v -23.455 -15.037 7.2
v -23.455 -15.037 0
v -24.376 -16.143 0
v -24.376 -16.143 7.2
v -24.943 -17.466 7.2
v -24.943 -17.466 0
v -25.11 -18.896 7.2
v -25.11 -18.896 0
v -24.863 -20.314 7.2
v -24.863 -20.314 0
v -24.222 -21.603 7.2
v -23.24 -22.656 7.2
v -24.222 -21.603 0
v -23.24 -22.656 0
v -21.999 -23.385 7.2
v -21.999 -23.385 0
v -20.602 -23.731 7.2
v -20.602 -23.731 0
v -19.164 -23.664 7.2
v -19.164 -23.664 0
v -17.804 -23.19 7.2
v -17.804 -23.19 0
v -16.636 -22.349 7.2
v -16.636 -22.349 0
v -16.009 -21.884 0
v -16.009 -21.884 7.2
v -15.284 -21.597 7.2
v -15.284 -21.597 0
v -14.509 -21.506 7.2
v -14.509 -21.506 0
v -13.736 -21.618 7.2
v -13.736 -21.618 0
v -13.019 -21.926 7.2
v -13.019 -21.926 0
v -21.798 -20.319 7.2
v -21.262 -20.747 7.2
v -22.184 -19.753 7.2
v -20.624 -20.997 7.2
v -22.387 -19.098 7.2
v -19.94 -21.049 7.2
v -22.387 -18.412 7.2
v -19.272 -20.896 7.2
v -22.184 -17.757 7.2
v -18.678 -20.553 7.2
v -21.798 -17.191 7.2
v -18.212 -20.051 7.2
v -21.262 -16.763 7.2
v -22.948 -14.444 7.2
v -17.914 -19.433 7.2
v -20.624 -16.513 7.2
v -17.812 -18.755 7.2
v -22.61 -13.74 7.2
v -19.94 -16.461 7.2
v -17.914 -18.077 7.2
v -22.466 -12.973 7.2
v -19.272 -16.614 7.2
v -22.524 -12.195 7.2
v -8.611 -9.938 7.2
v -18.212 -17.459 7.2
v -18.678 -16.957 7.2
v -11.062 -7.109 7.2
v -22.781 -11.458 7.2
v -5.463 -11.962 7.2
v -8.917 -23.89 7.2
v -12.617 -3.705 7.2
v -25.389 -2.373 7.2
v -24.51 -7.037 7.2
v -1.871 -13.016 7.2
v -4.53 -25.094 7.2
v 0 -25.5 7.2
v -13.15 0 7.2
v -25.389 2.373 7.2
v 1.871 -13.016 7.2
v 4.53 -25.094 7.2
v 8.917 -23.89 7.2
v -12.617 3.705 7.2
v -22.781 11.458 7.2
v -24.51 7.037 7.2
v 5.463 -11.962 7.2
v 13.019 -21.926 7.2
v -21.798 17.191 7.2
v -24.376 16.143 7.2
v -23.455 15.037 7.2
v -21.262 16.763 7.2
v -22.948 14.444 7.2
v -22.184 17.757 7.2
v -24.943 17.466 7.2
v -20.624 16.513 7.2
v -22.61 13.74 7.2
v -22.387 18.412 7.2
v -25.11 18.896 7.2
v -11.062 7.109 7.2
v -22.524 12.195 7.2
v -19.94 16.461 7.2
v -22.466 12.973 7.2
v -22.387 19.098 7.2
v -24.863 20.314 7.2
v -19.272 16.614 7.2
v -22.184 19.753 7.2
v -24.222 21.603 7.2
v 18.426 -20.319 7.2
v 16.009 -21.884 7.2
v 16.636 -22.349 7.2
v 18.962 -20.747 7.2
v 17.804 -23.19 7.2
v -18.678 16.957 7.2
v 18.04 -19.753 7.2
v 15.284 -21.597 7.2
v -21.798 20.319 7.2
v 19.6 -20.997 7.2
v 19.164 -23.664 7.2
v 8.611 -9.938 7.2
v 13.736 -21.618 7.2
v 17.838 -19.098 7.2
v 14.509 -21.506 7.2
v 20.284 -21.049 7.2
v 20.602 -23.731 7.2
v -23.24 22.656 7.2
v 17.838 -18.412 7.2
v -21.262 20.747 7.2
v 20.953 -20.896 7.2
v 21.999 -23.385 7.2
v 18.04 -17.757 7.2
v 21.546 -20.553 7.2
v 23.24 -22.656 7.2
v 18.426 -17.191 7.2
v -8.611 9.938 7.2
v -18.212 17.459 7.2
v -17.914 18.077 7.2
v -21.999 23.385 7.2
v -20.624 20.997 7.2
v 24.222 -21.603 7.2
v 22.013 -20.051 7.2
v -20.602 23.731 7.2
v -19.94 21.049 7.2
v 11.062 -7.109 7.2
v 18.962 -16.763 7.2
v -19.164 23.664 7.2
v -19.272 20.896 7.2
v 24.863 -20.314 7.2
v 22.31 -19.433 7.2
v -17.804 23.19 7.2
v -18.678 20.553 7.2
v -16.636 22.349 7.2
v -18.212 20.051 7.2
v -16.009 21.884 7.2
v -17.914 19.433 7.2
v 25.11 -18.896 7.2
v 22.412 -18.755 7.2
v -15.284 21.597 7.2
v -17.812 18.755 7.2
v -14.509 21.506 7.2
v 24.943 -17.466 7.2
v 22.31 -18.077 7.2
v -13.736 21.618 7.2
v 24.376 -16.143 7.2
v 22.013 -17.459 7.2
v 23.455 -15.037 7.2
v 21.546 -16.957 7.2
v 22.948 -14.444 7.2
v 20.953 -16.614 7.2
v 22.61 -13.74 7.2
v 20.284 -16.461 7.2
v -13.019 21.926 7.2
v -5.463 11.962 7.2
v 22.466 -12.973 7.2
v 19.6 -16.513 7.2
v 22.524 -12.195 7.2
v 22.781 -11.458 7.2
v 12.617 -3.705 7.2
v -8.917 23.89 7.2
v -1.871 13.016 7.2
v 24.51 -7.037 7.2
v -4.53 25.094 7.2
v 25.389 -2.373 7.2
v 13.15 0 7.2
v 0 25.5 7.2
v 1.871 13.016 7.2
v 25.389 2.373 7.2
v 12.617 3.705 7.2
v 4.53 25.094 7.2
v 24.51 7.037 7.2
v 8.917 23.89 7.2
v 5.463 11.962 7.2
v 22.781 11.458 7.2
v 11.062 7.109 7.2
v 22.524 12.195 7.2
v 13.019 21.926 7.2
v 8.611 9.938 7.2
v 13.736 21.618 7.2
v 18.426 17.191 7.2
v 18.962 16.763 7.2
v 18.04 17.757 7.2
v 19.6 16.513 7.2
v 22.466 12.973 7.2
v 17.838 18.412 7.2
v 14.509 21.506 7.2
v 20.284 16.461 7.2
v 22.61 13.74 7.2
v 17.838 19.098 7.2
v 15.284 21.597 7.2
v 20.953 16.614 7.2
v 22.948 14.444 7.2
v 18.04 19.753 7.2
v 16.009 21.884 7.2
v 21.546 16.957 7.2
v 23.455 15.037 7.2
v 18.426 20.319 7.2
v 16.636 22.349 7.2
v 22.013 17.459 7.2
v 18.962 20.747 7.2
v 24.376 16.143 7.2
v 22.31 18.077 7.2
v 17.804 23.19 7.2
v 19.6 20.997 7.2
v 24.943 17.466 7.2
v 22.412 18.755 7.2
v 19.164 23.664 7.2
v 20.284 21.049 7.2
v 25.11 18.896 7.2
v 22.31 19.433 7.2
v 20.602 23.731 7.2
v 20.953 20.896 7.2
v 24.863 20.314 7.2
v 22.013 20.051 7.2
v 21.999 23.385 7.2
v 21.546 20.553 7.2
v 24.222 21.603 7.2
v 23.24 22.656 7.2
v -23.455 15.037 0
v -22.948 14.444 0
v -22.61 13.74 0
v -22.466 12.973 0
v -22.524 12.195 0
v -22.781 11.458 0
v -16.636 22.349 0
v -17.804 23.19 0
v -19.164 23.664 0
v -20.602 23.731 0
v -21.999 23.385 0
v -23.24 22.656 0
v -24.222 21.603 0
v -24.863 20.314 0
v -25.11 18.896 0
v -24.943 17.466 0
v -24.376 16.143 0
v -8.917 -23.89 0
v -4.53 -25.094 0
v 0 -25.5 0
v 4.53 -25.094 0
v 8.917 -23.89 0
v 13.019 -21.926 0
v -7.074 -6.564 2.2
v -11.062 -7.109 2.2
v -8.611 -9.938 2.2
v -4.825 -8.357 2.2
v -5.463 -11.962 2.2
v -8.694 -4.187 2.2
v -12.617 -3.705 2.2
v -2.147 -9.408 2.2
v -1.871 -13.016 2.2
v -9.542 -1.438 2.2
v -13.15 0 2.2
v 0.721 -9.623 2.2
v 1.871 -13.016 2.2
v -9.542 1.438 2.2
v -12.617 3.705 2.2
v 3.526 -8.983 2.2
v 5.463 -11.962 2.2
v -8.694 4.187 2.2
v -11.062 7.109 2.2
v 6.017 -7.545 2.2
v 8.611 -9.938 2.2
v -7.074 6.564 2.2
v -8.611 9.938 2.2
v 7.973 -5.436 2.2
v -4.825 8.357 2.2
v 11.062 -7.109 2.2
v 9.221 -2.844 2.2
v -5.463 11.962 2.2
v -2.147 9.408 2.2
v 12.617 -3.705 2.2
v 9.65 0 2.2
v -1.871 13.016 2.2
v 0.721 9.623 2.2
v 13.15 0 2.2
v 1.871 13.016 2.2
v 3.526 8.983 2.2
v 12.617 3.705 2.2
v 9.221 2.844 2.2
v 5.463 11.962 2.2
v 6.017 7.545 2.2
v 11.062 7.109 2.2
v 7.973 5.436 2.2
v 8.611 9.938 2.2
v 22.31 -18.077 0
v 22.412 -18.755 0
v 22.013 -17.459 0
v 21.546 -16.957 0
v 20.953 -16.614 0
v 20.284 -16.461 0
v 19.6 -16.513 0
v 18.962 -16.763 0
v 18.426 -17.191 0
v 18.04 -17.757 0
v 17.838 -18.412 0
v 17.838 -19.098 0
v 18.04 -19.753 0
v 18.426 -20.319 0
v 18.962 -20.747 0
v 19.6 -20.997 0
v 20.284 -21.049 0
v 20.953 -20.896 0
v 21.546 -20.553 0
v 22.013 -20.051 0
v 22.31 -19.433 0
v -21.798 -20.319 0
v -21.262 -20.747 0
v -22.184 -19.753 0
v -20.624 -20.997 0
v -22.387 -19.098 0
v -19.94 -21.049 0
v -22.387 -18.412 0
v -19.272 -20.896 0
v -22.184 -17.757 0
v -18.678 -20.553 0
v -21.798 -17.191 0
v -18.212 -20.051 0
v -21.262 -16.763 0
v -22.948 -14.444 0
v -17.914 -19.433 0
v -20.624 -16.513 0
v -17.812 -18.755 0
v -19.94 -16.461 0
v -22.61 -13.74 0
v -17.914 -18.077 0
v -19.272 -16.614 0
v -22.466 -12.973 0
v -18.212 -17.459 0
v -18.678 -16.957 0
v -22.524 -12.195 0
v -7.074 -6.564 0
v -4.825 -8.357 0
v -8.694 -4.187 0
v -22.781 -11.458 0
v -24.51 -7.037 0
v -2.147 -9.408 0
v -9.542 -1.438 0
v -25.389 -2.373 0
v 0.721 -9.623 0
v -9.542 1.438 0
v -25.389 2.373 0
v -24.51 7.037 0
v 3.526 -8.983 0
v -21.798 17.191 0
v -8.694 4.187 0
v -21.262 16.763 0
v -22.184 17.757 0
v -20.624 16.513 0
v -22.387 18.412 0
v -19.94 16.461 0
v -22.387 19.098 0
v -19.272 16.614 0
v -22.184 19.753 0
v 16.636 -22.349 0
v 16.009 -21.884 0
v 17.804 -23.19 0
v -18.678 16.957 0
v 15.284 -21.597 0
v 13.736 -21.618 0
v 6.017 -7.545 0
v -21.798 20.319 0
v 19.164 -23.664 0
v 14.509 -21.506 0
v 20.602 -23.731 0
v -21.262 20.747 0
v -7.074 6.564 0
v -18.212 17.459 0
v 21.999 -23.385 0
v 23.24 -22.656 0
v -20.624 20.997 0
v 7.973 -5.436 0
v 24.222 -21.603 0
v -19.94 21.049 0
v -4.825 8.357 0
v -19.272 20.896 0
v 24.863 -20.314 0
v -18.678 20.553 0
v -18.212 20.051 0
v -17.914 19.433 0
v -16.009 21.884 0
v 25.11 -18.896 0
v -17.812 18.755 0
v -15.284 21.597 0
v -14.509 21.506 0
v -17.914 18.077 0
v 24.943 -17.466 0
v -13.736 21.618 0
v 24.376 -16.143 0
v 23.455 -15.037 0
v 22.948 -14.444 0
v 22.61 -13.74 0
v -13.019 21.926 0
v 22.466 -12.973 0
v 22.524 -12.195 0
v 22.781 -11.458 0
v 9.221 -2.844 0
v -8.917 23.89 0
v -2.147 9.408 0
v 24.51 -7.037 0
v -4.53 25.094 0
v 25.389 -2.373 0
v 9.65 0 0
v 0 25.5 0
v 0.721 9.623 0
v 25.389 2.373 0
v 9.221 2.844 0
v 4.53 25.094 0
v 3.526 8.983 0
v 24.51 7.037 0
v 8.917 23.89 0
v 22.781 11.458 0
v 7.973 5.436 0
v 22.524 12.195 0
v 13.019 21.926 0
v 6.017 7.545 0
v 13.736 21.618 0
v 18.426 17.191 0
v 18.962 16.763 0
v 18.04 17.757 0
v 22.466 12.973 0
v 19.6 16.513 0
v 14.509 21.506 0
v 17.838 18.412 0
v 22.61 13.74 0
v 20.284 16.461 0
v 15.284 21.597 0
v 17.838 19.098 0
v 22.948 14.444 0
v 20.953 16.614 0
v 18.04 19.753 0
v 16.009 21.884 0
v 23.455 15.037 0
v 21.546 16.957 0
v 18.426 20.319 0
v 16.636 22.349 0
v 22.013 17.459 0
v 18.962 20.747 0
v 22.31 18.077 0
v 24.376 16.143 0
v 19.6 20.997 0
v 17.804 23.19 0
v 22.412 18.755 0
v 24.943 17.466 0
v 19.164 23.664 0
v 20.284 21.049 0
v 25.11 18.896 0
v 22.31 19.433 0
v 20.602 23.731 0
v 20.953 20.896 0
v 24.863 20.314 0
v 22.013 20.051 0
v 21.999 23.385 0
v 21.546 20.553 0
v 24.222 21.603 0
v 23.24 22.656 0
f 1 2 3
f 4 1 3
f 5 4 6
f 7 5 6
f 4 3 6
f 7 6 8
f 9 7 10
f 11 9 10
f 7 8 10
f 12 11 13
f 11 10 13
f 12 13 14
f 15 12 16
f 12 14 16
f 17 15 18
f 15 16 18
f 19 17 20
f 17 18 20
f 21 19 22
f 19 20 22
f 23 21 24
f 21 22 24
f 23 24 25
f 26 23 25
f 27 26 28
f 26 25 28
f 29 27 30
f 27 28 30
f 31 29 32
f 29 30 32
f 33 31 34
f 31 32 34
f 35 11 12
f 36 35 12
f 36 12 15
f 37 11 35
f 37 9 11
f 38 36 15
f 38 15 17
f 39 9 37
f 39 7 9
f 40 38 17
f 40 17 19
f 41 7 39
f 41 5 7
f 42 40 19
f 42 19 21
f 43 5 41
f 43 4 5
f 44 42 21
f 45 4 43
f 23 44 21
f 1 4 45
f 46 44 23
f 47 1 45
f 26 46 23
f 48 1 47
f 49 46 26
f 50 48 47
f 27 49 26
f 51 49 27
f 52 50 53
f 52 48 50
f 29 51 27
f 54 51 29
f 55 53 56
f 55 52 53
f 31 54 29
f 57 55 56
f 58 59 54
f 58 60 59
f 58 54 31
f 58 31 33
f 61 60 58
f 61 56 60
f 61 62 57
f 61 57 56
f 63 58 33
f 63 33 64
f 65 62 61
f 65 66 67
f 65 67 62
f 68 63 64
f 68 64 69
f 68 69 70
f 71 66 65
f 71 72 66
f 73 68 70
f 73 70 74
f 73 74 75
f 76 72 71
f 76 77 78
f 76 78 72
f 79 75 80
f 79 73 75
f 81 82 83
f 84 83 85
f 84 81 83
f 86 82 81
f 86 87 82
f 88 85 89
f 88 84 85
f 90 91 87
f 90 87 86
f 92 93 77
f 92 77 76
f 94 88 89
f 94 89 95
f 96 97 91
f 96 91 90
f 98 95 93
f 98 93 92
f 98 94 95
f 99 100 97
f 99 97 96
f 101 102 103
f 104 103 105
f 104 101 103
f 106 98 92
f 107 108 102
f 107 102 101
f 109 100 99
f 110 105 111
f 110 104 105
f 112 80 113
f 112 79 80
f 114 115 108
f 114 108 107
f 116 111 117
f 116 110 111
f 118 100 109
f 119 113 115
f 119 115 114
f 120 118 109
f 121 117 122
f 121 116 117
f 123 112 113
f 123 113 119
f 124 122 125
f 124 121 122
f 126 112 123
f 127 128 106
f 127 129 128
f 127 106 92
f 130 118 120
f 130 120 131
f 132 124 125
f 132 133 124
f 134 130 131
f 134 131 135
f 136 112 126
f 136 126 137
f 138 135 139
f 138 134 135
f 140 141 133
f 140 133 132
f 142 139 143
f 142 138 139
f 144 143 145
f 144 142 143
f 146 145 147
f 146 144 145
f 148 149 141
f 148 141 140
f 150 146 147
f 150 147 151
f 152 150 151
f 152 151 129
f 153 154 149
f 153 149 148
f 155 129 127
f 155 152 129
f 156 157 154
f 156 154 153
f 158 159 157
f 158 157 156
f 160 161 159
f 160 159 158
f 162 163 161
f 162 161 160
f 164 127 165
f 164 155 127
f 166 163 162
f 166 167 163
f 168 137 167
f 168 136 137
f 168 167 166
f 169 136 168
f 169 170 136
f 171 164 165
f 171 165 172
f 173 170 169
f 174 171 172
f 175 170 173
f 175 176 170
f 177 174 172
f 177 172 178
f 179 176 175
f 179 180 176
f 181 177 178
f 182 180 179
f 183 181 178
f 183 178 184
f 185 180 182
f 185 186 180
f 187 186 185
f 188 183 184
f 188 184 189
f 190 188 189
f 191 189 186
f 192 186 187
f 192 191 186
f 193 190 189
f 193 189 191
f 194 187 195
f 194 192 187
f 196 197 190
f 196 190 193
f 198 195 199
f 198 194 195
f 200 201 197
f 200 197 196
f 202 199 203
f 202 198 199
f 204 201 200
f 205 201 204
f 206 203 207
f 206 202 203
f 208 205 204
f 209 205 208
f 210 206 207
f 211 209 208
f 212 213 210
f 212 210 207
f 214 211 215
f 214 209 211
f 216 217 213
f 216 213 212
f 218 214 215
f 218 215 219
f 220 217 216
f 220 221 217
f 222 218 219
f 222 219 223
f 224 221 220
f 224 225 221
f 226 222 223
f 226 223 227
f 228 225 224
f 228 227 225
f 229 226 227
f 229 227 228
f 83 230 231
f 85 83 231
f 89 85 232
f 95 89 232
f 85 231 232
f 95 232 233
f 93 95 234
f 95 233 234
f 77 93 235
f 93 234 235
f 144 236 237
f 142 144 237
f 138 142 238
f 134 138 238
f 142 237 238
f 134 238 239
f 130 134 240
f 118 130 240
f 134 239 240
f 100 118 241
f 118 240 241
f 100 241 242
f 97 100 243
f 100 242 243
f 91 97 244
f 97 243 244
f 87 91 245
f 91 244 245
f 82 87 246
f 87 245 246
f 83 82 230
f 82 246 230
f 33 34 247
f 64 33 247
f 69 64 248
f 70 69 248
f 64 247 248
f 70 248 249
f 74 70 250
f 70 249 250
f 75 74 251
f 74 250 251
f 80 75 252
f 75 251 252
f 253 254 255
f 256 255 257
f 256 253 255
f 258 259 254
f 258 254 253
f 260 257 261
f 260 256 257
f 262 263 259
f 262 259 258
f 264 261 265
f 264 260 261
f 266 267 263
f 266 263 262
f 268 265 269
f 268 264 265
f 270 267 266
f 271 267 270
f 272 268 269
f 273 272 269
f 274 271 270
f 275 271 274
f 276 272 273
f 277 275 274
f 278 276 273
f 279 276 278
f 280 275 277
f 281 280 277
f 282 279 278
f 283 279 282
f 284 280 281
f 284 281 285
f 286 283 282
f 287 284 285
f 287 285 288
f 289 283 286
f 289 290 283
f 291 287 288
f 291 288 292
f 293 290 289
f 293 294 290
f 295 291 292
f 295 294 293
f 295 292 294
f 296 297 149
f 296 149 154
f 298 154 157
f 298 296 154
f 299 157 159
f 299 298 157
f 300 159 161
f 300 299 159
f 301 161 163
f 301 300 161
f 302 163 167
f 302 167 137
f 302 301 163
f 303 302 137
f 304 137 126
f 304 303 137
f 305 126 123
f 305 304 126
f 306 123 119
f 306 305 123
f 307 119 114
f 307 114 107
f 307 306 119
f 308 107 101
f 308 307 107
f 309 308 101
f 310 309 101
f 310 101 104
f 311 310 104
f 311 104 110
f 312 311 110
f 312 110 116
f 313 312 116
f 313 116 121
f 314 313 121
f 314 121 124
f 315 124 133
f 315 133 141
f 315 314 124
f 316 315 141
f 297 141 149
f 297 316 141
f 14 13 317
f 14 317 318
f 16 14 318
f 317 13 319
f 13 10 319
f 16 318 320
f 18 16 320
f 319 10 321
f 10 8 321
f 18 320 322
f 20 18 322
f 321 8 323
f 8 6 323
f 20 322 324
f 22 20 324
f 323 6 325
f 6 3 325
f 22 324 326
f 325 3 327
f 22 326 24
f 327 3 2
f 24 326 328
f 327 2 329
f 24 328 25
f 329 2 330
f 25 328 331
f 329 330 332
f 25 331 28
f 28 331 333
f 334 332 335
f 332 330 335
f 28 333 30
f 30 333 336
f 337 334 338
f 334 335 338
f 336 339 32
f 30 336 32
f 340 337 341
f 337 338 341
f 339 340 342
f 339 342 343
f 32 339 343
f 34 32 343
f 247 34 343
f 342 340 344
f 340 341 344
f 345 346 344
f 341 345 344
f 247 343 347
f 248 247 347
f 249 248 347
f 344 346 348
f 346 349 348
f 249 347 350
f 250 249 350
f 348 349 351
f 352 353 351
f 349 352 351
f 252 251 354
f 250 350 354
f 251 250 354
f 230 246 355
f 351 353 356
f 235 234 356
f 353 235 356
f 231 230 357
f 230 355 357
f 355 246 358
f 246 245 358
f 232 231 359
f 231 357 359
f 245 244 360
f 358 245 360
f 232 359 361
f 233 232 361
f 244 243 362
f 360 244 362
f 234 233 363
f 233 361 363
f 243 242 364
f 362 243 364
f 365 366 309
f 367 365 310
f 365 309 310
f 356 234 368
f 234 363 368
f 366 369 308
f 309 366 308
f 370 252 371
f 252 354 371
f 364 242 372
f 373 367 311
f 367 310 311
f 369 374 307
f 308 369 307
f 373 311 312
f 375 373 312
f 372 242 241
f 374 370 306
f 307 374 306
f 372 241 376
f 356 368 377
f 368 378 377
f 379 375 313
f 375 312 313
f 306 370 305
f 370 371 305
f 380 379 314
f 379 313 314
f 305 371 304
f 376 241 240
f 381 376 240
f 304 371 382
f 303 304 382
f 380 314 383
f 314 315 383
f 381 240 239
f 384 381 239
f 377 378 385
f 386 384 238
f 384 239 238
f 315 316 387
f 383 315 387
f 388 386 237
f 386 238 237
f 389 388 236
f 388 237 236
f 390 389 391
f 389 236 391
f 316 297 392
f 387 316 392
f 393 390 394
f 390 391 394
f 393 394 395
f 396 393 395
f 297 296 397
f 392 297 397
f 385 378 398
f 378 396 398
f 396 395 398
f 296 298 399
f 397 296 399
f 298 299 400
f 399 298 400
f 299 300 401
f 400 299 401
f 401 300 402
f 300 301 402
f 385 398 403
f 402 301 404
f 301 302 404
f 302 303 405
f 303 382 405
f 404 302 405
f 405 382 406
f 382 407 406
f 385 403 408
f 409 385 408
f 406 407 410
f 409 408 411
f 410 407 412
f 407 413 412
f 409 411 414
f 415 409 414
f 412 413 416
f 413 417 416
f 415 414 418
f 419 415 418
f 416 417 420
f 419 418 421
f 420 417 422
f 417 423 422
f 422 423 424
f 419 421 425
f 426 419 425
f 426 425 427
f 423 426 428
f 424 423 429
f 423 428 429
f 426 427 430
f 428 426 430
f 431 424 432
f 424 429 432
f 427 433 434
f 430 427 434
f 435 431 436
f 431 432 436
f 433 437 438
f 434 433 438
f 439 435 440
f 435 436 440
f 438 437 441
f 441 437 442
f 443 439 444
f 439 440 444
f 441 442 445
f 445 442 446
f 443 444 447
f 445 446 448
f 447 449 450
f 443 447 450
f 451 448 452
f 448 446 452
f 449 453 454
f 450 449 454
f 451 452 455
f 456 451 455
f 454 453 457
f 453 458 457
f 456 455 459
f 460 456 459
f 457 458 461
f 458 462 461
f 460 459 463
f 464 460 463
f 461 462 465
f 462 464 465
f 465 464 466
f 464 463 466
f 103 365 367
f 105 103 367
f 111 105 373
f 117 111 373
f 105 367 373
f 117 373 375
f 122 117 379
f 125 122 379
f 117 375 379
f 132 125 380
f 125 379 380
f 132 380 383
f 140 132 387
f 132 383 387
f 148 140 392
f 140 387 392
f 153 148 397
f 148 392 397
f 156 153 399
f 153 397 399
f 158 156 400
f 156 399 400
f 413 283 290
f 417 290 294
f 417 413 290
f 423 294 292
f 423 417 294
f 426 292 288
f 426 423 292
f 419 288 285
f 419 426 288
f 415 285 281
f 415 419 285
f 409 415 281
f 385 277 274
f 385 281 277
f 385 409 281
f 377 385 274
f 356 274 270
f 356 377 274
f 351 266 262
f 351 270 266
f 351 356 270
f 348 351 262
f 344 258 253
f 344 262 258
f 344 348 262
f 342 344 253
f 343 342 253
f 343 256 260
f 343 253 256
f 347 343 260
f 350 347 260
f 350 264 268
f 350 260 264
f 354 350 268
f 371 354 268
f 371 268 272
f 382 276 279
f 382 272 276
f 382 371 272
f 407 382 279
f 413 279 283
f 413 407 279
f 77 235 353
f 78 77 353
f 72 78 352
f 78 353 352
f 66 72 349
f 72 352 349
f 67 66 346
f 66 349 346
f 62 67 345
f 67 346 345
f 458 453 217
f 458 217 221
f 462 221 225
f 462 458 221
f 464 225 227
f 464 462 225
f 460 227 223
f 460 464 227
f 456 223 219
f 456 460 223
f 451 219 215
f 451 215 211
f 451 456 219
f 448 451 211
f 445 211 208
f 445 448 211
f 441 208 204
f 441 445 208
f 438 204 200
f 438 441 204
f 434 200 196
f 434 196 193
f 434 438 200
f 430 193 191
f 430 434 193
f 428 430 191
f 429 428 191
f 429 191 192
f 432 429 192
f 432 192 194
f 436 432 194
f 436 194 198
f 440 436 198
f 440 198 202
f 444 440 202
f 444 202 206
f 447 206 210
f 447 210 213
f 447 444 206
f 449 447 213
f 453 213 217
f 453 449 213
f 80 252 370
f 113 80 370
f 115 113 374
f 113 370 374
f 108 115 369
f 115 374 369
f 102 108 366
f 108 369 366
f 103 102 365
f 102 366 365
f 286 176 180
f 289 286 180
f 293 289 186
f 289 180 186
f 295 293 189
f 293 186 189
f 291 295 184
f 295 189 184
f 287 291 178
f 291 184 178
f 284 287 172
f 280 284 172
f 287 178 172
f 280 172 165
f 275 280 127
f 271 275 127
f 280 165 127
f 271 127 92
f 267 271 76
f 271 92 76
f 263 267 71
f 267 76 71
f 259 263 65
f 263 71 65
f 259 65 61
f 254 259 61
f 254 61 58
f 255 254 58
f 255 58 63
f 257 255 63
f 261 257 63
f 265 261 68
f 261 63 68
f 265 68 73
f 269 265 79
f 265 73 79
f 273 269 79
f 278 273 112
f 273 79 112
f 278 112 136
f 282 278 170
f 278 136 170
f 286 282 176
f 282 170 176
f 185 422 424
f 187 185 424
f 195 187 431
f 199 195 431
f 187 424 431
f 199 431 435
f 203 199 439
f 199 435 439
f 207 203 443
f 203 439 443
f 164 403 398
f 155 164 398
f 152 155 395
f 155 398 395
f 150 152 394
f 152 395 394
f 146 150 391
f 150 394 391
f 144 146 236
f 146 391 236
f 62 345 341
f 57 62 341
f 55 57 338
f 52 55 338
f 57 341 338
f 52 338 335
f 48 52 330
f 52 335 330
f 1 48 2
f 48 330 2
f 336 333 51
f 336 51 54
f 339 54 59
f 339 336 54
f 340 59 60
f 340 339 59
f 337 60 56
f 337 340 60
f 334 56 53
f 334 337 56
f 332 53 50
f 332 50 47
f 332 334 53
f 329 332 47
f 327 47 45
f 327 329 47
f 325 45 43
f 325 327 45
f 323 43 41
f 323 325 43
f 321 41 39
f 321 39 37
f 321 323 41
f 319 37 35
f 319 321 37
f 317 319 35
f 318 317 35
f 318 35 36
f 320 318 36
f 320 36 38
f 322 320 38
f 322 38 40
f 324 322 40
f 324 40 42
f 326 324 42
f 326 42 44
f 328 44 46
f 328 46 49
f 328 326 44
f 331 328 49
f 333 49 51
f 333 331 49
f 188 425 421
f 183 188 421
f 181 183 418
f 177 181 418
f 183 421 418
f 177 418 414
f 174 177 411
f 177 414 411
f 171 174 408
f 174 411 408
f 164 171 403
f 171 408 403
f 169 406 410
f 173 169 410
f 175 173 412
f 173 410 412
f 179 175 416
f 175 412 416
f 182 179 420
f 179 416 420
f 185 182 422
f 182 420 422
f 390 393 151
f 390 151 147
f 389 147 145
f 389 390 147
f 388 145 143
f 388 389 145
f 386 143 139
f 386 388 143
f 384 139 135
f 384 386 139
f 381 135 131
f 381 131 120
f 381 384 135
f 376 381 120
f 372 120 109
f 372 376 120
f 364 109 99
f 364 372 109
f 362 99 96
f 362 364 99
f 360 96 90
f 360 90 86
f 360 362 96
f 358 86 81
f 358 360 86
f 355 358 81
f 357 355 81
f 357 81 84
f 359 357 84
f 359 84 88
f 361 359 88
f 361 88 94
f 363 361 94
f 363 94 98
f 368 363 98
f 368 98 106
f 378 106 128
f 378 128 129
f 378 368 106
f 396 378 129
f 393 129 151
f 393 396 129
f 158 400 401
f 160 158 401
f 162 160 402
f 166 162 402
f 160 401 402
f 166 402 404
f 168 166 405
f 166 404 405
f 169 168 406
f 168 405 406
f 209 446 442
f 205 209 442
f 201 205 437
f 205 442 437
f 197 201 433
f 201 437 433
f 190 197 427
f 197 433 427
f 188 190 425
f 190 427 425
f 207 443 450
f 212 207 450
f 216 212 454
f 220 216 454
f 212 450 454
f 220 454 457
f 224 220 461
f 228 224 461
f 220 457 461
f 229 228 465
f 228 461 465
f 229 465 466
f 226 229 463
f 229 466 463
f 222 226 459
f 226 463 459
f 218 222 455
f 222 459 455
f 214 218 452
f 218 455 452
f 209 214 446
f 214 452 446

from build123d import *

# Parameters (mm, degrees)
SKETCH_1_R          = 9.65
SKETCH_1_R_2        = 2.3
EXTRUDE_1_DEPTH     = 7.2
SKETCH_3_R          = 13.15
CUT_EXTRUDE_2_DEPTH = 5


with BuildPart() as part:
    # Эскиз1 → Бобышка-Вытянуть1 (new body)
    with BuildSketch(Plane.XY):
        with BuildLine():
            ThreePointArc((16.636311976, -22.349119084), (23.768995303, -22.164946702), (23.455168213, -15.036791017))
            ThreePointArc((23.455168213, -15.036791017), (22.512808868, -13.361377812), (22.780834847, -11.457903983))
            ThreePointArc((22.780834847, -11.457903983), (25.5, 0), (22.780834847, 11.457903983))
            ThreePointArc((22.780834847, 11.457903983), (22.512808868, 13.361377812), (23.455168213, 15.036791017))
            ThreePointArc((23.455168213, 15.036791017), (23.768995303, 22.164946702), (16.636311976, 22.349119084))
            ThreePointArc((16.636311976, 22.349119084), (14.899244328, 21.525926197), (13.019103812, 21.9260789))
            ThreePointArc((13.019103812, 21.9260789), (0, 25.5), (-13.019103812, 21.9260789))
            ThreePointArc((-13.019103812, 21.9260789), (-14.899244328, 21.525926197), (-16.636311976, 22.349119084))
            ThreePointArc((-16.636311976, 22.349119084), (-23.768995303, 22.164946702), (-23.455168213, 15.036791017))
            ThreePointArc((-23.455168213, 15.036791017), (-22.512808868, 13.361377812), (-22.780834847, 11.457903983))
            ThreePointArc((-22.780834847, 11.457903983), (-25.5, 0), (-22.780834847, -11.457903983))
            ThreePointArc((-22.780834847, -11.457903983), (-22.512808868, -13.361377812), (-23.455168213, -15.036791017))
            ThreePointArc((-23.455168213, -15.036791017), (-23.768995303, -22.164946702), (-16.636311976, -22.349119084))
            ThreePointArc((-16.636311976, -22.349119084), (-14.899244328, -21.525926197), (-13.019103812, -21.9260789))
            ThreePointArc((-13.019103812, -21.9260789), (0, -25.5), (13.019103812, -21.9260789))
            ThreePointArc((13.019103812, -21.9260789), (14.899244328, -21.525926197), (16.636311976, -22.349119084))
        make_face()
        Circle(SKETCH_1_R, mode=Mode.SUBTRACT)
        with Locations((-20.112226795, -18.754954902)):
            Circle(SKETCH_1_R_2, mode=Mode.SUBTRACT)
        with Locations((20.112226795, -18.754954902)):
            Circle(SKETCH_1_R_2, mode=Mode.SUBTRACT)
        with Locations((20.112226795, 18.754954902)):
            Circle(SKETCH_1_R_2, mode=Mode.SUBTRACT)
        with Locations((-20.112226795, 18.754954902)):
            Circle(SKETCH_1_R_2, mode=Mode.SUBTRACT)
    extrude(amount=EXTRUDE_1_DEPTH)

    # Эскиз3 → Вырез-Вытянуть2 (cut)
    with BuildSketch(Plane.XY.offset(7.2)):
        Circle(SKETCH_3_R)
    extrude(amount=-CUT_EXTRUDE_2_DEPTH, mode=Mode.SUBTRACT)


solid = part.part
